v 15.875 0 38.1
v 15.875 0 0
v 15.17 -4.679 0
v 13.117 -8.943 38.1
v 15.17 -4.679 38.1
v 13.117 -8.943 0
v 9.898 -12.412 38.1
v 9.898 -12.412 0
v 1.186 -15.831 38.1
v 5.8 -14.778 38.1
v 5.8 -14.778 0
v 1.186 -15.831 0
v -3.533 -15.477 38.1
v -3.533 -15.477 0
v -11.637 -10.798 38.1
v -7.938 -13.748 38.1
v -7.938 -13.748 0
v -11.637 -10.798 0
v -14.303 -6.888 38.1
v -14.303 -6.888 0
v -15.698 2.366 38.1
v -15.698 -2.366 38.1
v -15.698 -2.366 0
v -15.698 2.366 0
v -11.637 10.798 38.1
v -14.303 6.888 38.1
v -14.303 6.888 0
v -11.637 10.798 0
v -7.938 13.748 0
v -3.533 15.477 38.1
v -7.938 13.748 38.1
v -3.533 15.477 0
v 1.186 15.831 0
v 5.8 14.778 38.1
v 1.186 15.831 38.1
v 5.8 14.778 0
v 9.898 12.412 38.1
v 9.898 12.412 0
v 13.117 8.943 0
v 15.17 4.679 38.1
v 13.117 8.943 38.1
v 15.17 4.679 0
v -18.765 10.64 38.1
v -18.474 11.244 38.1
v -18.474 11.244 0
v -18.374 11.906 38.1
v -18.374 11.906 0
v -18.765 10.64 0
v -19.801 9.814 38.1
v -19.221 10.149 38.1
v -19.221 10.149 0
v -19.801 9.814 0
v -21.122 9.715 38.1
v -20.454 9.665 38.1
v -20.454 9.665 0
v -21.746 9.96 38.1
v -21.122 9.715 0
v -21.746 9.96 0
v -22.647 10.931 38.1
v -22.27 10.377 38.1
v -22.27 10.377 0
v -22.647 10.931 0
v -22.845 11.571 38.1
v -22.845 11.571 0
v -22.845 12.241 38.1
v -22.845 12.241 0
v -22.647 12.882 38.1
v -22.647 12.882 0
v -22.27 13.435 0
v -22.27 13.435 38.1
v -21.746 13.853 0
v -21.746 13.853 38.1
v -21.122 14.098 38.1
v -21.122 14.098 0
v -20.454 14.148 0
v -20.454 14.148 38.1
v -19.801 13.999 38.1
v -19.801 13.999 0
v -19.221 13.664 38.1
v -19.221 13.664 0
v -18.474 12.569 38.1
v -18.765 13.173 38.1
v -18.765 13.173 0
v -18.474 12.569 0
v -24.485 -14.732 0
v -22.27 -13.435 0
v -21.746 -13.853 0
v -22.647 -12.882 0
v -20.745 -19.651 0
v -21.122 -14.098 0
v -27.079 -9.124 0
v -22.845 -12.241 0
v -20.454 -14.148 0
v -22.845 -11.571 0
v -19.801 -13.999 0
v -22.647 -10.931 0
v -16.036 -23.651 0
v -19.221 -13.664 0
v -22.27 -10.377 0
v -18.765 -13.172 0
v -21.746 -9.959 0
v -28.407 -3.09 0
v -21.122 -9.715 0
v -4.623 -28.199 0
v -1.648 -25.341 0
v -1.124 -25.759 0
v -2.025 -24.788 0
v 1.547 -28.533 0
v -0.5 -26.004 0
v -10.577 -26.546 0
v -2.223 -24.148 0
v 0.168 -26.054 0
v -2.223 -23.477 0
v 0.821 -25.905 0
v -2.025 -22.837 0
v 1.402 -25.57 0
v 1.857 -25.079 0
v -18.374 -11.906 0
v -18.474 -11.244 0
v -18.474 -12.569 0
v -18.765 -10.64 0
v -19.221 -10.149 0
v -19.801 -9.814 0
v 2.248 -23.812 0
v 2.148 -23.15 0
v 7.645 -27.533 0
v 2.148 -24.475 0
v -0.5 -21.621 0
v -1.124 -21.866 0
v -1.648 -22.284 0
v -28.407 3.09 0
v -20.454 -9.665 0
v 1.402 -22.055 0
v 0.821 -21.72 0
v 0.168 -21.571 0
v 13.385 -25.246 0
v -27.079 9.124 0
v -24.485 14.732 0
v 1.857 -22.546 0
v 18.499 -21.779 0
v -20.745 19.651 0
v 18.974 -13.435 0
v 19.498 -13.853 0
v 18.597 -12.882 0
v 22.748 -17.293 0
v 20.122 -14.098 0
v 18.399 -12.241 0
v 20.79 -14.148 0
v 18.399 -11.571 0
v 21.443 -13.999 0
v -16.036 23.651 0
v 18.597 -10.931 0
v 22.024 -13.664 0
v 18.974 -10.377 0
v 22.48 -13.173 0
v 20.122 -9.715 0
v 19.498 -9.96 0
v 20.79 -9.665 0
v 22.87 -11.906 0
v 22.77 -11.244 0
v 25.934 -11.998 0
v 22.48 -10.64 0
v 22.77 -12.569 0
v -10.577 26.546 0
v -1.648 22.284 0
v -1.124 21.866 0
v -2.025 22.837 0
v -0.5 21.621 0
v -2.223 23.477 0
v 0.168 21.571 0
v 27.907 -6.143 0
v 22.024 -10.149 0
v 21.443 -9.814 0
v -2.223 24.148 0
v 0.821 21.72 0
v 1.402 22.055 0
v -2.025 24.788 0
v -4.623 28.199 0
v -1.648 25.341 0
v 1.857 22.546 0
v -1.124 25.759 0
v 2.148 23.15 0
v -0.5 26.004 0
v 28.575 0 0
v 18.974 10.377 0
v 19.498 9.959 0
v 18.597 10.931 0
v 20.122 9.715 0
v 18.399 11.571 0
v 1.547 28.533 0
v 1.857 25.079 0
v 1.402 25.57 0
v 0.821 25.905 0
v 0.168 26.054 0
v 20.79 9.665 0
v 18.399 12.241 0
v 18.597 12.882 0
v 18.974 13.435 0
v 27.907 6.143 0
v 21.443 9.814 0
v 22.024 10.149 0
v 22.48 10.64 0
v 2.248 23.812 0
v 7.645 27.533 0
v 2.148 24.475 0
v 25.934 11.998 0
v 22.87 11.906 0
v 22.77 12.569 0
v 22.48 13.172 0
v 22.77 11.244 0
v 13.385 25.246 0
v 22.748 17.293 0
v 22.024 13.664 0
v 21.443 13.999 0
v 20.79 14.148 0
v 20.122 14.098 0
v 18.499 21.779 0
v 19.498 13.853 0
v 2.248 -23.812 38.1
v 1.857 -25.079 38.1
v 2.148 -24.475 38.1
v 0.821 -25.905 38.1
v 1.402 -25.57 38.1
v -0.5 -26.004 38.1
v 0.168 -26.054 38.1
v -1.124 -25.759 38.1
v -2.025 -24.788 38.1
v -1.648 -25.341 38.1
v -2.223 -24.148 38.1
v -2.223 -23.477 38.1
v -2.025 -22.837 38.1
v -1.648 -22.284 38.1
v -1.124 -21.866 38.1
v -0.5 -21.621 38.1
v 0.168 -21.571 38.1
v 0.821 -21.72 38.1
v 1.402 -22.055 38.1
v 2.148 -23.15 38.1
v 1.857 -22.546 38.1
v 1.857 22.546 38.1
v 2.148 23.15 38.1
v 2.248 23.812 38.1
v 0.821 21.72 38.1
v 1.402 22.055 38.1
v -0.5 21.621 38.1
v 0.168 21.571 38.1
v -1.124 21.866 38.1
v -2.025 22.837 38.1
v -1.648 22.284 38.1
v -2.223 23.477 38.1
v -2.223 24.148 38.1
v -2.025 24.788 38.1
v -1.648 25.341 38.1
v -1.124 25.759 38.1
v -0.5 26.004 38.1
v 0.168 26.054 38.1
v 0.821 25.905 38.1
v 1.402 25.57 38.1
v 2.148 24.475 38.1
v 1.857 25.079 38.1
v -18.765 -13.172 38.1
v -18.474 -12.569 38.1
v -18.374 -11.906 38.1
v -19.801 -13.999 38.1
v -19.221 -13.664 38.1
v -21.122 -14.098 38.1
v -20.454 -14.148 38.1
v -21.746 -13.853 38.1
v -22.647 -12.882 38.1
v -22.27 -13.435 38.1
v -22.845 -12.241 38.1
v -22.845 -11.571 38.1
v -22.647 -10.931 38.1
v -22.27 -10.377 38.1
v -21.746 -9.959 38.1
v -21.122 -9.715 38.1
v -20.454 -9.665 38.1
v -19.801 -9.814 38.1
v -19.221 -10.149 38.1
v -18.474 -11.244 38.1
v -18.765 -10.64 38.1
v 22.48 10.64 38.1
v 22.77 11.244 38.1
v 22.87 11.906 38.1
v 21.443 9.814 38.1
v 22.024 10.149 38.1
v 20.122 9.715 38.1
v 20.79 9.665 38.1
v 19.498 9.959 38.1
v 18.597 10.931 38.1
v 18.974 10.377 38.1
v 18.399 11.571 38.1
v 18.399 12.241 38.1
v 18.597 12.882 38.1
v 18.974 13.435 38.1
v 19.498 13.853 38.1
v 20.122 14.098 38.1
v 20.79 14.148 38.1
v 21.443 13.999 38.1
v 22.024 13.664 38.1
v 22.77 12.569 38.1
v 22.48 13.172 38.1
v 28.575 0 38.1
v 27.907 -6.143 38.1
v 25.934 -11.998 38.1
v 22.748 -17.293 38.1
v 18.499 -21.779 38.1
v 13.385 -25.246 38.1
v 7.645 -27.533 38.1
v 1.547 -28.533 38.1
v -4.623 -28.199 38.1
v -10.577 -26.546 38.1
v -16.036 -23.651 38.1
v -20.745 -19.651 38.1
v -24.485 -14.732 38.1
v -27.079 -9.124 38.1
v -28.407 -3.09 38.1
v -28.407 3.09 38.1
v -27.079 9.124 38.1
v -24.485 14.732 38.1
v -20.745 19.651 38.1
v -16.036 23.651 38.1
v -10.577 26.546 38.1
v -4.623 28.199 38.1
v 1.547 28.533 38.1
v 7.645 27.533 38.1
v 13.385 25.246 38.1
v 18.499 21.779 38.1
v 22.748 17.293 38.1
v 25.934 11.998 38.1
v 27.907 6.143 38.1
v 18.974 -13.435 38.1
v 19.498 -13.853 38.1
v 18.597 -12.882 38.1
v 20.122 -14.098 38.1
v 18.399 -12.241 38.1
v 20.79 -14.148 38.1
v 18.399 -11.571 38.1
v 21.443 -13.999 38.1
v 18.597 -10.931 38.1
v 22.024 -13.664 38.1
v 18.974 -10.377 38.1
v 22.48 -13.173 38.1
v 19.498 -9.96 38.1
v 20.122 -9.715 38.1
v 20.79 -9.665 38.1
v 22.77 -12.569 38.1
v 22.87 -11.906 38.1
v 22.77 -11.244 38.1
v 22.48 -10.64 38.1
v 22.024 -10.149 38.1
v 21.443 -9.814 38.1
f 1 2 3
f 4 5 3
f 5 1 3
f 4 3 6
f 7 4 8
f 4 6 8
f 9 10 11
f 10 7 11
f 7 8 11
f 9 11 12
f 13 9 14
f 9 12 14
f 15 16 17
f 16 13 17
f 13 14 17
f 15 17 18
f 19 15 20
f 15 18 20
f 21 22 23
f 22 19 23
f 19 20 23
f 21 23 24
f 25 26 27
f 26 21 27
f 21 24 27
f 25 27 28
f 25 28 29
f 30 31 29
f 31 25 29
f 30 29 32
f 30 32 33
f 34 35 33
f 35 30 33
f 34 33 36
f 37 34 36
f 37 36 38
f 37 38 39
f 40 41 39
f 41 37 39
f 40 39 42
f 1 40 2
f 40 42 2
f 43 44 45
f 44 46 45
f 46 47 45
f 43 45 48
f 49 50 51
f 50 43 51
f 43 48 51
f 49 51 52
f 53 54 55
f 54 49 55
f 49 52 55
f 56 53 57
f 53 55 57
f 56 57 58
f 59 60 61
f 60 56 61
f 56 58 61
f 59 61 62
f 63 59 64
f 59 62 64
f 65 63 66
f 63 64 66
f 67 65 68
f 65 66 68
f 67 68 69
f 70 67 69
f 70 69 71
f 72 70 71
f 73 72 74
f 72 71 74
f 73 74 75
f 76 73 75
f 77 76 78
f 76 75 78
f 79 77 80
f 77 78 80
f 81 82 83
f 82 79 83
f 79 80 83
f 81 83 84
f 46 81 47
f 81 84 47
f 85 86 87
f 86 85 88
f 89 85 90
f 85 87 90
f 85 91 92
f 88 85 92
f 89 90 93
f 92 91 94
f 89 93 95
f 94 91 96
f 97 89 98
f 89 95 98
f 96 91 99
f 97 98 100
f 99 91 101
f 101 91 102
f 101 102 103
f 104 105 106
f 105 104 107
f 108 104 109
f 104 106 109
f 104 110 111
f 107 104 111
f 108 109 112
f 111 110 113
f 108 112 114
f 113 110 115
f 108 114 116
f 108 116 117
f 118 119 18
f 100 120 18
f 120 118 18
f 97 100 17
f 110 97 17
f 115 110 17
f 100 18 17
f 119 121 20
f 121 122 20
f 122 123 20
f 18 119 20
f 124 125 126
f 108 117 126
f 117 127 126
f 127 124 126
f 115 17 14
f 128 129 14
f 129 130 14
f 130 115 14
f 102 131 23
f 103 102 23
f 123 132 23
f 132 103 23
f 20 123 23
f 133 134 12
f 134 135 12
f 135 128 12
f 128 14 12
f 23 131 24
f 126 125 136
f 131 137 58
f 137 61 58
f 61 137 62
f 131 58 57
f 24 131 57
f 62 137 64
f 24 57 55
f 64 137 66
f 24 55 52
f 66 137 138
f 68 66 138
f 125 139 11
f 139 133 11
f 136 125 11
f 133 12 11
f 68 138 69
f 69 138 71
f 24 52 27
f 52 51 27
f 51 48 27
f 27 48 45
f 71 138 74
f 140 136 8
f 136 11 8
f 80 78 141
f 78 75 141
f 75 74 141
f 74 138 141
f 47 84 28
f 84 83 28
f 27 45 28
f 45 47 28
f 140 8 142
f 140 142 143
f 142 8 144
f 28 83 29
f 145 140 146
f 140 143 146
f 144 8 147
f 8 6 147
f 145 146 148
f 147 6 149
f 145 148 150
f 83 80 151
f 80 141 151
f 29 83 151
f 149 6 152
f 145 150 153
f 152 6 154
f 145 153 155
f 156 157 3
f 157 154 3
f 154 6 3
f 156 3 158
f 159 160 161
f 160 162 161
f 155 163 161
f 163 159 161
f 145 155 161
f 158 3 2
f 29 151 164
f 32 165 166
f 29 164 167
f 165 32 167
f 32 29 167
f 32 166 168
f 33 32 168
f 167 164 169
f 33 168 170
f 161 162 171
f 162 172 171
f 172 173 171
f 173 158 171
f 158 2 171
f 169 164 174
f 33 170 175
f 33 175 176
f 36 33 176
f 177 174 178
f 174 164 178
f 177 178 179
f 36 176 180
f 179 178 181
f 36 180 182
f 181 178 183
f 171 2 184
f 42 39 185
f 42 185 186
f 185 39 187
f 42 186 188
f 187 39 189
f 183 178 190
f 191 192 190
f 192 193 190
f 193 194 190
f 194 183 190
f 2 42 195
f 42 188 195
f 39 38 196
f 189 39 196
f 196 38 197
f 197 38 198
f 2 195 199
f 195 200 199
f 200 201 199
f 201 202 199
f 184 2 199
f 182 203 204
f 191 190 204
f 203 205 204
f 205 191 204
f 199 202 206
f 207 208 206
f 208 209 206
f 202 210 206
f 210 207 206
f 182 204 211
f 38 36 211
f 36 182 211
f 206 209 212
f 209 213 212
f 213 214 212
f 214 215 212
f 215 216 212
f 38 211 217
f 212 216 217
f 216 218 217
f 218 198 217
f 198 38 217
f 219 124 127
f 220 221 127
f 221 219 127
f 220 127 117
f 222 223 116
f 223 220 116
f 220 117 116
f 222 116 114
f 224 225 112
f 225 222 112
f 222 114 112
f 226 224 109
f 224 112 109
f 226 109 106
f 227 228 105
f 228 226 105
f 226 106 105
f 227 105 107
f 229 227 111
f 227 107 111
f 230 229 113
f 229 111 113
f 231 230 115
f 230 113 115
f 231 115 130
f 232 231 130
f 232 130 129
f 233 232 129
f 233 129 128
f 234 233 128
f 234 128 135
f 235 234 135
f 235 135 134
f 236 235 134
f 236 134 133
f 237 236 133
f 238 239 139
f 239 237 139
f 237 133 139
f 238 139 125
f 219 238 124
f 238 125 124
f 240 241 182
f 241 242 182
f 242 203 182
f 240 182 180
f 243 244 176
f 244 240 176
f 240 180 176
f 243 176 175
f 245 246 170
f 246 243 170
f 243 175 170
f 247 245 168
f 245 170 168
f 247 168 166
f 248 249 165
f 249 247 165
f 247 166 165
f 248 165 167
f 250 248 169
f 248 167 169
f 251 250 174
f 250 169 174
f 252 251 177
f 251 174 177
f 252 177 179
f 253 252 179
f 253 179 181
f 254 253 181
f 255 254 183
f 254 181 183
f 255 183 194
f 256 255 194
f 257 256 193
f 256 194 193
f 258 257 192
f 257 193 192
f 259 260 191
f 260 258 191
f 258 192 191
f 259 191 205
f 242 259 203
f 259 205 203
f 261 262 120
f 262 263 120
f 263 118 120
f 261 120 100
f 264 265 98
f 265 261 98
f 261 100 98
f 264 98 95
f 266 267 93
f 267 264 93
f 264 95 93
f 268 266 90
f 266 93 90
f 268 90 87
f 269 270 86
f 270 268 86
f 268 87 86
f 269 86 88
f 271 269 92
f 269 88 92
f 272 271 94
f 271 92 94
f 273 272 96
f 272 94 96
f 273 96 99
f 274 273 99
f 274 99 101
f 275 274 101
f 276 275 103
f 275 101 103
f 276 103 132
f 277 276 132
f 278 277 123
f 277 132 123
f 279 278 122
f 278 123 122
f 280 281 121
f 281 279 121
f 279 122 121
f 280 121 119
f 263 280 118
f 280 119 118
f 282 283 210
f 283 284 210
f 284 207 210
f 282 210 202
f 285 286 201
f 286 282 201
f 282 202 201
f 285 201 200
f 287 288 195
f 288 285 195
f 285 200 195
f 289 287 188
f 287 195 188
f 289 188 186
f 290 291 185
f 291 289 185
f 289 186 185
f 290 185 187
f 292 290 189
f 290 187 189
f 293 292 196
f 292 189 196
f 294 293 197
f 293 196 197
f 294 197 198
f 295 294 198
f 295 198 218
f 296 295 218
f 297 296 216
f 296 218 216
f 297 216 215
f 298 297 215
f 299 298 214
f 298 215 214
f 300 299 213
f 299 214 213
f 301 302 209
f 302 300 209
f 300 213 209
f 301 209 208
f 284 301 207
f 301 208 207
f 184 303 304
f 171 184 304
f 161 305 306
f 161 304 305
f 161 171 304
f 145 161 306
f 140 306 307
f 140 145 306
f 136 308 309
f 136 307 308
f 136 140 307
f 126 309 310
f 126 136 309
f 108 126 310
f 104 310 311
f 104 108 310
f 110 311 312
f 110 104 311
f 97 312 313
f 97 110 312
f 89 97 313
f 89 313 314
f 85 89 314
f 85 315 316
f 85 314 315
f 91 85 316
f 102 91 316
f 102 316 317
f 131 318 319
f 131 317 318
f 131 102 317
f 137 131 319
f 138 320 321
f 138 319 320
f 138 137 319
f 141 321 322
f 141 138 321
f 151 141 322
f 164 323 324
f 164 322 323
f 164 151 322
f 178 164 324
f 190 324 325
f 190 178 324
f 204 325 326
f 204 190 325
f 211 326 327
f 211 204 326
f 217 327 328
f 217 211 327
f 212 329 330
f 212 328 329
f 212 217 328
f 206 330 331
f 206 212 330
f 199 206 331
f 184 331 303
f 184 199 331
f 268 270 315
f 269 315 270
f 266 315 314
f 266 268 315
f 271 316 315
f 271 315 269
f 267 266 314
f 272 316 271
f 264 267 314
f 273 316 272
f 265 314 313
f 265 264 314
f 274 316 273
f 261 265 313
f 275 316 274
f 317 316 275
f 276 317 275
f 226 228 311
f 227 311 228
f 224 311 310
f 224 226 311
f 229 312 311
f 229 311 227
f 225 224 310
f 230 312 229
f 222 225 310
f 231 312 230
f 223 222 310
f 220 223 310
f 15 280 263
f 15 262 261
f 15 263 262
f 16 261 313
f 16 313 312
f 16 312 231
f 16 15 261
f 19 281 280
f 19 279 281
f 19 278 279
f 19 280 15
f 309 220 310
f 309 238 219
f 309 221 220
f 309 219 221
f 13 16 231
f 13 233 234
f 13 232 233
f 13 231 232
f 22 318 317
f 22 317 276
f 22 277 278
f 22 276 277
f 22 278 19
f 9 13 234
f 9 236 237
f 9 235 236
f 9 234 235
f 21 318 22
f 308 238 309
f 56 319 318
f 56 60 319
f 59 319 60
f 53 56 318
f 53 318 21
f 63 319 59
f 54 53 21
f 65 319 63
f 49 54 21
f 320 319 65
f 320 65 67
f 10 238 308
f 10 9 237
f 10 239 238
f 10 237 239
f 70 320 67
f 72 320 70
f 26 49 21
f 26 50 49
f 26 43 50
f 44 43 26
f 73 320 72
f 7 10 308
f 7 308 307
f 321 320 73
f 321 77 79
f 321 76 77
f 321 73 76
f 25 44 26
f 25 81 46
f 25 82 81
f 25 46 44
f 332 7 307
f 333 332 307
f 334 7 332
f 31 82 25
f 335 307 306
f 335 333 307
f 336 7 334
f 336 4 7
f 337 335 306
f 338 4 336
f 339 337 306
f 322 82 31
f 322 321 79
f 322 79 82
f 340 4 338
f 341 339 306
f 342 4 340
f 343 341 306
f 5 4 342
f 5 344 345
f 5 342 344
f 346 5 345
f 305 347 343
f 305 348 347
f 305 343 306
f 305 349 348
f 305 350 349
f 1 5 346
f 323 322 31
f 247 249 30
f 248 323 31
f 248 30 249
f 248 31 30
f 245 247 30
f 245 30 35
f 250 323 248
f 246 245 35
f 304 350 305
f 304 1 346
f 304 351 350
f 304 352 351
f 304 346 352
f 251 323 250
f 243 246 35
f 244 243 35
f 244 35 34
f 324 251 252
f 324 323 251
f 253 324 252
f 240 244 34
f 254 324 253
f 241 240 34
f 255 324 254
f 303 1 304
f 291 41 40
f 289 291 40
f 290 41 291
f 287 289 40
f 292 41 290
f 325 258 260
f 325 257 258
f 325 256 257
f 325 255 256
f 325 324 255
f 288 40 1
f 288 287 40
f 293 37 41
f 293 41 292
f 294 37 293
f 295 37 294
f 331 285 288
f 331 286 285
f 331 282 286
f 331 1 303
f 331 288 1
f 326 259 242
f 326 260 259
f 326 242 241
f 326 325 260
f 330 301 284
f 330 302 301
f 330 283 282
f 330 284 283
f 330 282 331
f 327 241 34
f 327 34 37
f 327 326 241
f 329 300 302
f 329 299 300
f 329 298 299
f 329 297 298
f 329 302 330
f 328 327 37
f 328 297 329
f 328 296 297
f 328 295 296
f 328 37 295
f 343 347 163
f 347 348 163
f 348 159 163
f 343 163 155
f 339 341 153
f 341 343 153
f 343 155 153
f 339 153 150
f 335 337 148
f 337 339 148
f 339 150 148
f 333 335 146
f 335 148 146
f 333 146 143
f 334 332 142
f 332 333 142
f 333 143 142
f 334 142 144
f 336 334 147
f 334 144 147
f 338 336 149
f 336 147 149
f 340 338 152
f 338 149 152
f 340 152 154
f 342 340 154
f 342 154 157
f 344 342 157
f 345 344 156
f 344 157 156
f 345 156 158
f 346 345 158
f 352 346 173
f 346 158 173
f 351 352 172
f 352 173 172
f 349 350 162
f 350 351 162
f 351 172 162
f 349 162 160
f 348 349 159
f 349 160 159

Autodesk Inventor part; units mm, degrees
ref_plane "YZ Plane" through (0, 0, 0) normal (1, 0, 0) x (0, 1, 0)
ref_plane "XZ Plane" through (0, 0, 0) normal (0, 1, 0) x (-1, 0, 0)
ref_plane "XY Plane" through (0, 0, 0) normal (0, 0, 1) x (1, 0, 0)
sketch "Sketch1" plane through (0, 0, 0) normal (0, 0, 1) x (1, 0, 0)
  circle A0 centre (0, 0) radius 15.875
  circle A1 centre (0, 0) radius 23.8125 construction
  circle A2 centre (0, 23.8125) radius 2.2479
  circle A3 centre (-20.6222, 11.9063) radius 2.2479
  circle A4 centre (-20.6222, -11.9062) radius 2.2479
  circle A5 centre (0, -23.8125) radius 2.2479
  circle A6 centre (20.6222, -11.9063) radius 2.2479
  circle A7 centre (20.6222, 11.9062) radius 2.2479
  circle A8 centre (0, 0) radius 28.575
  dimension "d1" = 47.625
  dimension "d0" = 31.75
  dimension "d2" = 4.4958
  dimension "d5" = 360
  dimension "d7" = 57.15
extrude "Extrusion1" add sketch "Sketch1" along normal blind 38.1
properties part number "Spacer Between Wheels V2" material "Polycarbonate, Clear"
